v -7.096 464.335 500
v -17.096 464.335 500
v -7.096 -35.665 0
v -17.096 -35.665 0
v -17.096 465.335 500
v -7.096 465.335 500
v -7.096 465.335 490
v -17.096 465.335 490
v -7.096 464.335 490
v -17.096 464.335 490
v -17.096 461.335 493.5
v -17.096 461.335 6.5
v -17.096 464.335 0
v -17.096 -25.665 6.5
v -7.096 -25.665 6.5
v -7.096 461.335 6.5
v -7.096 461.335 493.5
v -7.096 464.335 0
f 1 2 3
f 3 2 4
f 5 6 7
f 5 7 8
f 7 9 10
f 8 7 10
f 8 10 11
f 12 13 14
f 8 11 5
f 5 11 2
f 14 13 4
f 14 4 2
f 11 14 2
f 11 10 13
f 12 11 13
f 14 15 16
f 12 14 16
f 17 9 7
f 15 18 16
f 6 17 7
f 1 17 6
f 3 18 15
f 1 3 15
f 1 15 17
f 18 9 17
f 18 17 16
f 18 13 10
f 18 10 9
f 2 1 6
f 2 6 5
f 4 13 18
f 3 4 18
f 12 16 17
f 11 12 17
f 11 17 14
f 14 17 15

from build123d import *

# Parameters (mm, degrees)
F0_W     = 10
F0_H     = 500
F1_DEPTH = 500
F3_DEPTH = 10
F5_DEPTH = 10
F6_W     = 10
F6_H     = 10
F7_DEPTH = 1


with BuildPart() as f1:
    # F0 (on Top) → F1 (new body)
    with BuildSketch(Plane.XY):
        with Locations((-12.096023, 214.334732)):
            Rectangle(F0_W, F0_H)
    extrude(amount=F1_DEPTH)

    # F2 (on face) → F3 (cut)
    with BuildSketch(Plane(origin=(-17.096023, 0, 0), x_dir=(0, -1, 0), z_dir=(-1, 0, 0))):
        Polygon((35.665268, 500), (-464.334732, 500), (35.665268, 0), align=None)
    extrude(amount=-F3_DEPTH, mode=Mode.SUBTRACT)

    # F4 (on face) → F5 (cut)
    with BuildSketch(Plane.YZ.offset(-7.096023)):
        Polygon((461.334732, 493.5), (-25.665268, 6.5), (461.334732, 6.5), align=None)
    extrude(amount=-F5_DEPTH, mode=Mode.SUBTRACT)

    # F6 (on face) → F7 (join)
    with BuildSketch(Plane(origin=(0, 464.334732, 0), x_dir=(-1, 0, 0), z_dir=(0, 1, 0))):
        with Locations((12.096023, 495)):
            Rectangle(F6_W, F6_H)
    extrude(amount=F7_DEPTH)


solid = f1.part
